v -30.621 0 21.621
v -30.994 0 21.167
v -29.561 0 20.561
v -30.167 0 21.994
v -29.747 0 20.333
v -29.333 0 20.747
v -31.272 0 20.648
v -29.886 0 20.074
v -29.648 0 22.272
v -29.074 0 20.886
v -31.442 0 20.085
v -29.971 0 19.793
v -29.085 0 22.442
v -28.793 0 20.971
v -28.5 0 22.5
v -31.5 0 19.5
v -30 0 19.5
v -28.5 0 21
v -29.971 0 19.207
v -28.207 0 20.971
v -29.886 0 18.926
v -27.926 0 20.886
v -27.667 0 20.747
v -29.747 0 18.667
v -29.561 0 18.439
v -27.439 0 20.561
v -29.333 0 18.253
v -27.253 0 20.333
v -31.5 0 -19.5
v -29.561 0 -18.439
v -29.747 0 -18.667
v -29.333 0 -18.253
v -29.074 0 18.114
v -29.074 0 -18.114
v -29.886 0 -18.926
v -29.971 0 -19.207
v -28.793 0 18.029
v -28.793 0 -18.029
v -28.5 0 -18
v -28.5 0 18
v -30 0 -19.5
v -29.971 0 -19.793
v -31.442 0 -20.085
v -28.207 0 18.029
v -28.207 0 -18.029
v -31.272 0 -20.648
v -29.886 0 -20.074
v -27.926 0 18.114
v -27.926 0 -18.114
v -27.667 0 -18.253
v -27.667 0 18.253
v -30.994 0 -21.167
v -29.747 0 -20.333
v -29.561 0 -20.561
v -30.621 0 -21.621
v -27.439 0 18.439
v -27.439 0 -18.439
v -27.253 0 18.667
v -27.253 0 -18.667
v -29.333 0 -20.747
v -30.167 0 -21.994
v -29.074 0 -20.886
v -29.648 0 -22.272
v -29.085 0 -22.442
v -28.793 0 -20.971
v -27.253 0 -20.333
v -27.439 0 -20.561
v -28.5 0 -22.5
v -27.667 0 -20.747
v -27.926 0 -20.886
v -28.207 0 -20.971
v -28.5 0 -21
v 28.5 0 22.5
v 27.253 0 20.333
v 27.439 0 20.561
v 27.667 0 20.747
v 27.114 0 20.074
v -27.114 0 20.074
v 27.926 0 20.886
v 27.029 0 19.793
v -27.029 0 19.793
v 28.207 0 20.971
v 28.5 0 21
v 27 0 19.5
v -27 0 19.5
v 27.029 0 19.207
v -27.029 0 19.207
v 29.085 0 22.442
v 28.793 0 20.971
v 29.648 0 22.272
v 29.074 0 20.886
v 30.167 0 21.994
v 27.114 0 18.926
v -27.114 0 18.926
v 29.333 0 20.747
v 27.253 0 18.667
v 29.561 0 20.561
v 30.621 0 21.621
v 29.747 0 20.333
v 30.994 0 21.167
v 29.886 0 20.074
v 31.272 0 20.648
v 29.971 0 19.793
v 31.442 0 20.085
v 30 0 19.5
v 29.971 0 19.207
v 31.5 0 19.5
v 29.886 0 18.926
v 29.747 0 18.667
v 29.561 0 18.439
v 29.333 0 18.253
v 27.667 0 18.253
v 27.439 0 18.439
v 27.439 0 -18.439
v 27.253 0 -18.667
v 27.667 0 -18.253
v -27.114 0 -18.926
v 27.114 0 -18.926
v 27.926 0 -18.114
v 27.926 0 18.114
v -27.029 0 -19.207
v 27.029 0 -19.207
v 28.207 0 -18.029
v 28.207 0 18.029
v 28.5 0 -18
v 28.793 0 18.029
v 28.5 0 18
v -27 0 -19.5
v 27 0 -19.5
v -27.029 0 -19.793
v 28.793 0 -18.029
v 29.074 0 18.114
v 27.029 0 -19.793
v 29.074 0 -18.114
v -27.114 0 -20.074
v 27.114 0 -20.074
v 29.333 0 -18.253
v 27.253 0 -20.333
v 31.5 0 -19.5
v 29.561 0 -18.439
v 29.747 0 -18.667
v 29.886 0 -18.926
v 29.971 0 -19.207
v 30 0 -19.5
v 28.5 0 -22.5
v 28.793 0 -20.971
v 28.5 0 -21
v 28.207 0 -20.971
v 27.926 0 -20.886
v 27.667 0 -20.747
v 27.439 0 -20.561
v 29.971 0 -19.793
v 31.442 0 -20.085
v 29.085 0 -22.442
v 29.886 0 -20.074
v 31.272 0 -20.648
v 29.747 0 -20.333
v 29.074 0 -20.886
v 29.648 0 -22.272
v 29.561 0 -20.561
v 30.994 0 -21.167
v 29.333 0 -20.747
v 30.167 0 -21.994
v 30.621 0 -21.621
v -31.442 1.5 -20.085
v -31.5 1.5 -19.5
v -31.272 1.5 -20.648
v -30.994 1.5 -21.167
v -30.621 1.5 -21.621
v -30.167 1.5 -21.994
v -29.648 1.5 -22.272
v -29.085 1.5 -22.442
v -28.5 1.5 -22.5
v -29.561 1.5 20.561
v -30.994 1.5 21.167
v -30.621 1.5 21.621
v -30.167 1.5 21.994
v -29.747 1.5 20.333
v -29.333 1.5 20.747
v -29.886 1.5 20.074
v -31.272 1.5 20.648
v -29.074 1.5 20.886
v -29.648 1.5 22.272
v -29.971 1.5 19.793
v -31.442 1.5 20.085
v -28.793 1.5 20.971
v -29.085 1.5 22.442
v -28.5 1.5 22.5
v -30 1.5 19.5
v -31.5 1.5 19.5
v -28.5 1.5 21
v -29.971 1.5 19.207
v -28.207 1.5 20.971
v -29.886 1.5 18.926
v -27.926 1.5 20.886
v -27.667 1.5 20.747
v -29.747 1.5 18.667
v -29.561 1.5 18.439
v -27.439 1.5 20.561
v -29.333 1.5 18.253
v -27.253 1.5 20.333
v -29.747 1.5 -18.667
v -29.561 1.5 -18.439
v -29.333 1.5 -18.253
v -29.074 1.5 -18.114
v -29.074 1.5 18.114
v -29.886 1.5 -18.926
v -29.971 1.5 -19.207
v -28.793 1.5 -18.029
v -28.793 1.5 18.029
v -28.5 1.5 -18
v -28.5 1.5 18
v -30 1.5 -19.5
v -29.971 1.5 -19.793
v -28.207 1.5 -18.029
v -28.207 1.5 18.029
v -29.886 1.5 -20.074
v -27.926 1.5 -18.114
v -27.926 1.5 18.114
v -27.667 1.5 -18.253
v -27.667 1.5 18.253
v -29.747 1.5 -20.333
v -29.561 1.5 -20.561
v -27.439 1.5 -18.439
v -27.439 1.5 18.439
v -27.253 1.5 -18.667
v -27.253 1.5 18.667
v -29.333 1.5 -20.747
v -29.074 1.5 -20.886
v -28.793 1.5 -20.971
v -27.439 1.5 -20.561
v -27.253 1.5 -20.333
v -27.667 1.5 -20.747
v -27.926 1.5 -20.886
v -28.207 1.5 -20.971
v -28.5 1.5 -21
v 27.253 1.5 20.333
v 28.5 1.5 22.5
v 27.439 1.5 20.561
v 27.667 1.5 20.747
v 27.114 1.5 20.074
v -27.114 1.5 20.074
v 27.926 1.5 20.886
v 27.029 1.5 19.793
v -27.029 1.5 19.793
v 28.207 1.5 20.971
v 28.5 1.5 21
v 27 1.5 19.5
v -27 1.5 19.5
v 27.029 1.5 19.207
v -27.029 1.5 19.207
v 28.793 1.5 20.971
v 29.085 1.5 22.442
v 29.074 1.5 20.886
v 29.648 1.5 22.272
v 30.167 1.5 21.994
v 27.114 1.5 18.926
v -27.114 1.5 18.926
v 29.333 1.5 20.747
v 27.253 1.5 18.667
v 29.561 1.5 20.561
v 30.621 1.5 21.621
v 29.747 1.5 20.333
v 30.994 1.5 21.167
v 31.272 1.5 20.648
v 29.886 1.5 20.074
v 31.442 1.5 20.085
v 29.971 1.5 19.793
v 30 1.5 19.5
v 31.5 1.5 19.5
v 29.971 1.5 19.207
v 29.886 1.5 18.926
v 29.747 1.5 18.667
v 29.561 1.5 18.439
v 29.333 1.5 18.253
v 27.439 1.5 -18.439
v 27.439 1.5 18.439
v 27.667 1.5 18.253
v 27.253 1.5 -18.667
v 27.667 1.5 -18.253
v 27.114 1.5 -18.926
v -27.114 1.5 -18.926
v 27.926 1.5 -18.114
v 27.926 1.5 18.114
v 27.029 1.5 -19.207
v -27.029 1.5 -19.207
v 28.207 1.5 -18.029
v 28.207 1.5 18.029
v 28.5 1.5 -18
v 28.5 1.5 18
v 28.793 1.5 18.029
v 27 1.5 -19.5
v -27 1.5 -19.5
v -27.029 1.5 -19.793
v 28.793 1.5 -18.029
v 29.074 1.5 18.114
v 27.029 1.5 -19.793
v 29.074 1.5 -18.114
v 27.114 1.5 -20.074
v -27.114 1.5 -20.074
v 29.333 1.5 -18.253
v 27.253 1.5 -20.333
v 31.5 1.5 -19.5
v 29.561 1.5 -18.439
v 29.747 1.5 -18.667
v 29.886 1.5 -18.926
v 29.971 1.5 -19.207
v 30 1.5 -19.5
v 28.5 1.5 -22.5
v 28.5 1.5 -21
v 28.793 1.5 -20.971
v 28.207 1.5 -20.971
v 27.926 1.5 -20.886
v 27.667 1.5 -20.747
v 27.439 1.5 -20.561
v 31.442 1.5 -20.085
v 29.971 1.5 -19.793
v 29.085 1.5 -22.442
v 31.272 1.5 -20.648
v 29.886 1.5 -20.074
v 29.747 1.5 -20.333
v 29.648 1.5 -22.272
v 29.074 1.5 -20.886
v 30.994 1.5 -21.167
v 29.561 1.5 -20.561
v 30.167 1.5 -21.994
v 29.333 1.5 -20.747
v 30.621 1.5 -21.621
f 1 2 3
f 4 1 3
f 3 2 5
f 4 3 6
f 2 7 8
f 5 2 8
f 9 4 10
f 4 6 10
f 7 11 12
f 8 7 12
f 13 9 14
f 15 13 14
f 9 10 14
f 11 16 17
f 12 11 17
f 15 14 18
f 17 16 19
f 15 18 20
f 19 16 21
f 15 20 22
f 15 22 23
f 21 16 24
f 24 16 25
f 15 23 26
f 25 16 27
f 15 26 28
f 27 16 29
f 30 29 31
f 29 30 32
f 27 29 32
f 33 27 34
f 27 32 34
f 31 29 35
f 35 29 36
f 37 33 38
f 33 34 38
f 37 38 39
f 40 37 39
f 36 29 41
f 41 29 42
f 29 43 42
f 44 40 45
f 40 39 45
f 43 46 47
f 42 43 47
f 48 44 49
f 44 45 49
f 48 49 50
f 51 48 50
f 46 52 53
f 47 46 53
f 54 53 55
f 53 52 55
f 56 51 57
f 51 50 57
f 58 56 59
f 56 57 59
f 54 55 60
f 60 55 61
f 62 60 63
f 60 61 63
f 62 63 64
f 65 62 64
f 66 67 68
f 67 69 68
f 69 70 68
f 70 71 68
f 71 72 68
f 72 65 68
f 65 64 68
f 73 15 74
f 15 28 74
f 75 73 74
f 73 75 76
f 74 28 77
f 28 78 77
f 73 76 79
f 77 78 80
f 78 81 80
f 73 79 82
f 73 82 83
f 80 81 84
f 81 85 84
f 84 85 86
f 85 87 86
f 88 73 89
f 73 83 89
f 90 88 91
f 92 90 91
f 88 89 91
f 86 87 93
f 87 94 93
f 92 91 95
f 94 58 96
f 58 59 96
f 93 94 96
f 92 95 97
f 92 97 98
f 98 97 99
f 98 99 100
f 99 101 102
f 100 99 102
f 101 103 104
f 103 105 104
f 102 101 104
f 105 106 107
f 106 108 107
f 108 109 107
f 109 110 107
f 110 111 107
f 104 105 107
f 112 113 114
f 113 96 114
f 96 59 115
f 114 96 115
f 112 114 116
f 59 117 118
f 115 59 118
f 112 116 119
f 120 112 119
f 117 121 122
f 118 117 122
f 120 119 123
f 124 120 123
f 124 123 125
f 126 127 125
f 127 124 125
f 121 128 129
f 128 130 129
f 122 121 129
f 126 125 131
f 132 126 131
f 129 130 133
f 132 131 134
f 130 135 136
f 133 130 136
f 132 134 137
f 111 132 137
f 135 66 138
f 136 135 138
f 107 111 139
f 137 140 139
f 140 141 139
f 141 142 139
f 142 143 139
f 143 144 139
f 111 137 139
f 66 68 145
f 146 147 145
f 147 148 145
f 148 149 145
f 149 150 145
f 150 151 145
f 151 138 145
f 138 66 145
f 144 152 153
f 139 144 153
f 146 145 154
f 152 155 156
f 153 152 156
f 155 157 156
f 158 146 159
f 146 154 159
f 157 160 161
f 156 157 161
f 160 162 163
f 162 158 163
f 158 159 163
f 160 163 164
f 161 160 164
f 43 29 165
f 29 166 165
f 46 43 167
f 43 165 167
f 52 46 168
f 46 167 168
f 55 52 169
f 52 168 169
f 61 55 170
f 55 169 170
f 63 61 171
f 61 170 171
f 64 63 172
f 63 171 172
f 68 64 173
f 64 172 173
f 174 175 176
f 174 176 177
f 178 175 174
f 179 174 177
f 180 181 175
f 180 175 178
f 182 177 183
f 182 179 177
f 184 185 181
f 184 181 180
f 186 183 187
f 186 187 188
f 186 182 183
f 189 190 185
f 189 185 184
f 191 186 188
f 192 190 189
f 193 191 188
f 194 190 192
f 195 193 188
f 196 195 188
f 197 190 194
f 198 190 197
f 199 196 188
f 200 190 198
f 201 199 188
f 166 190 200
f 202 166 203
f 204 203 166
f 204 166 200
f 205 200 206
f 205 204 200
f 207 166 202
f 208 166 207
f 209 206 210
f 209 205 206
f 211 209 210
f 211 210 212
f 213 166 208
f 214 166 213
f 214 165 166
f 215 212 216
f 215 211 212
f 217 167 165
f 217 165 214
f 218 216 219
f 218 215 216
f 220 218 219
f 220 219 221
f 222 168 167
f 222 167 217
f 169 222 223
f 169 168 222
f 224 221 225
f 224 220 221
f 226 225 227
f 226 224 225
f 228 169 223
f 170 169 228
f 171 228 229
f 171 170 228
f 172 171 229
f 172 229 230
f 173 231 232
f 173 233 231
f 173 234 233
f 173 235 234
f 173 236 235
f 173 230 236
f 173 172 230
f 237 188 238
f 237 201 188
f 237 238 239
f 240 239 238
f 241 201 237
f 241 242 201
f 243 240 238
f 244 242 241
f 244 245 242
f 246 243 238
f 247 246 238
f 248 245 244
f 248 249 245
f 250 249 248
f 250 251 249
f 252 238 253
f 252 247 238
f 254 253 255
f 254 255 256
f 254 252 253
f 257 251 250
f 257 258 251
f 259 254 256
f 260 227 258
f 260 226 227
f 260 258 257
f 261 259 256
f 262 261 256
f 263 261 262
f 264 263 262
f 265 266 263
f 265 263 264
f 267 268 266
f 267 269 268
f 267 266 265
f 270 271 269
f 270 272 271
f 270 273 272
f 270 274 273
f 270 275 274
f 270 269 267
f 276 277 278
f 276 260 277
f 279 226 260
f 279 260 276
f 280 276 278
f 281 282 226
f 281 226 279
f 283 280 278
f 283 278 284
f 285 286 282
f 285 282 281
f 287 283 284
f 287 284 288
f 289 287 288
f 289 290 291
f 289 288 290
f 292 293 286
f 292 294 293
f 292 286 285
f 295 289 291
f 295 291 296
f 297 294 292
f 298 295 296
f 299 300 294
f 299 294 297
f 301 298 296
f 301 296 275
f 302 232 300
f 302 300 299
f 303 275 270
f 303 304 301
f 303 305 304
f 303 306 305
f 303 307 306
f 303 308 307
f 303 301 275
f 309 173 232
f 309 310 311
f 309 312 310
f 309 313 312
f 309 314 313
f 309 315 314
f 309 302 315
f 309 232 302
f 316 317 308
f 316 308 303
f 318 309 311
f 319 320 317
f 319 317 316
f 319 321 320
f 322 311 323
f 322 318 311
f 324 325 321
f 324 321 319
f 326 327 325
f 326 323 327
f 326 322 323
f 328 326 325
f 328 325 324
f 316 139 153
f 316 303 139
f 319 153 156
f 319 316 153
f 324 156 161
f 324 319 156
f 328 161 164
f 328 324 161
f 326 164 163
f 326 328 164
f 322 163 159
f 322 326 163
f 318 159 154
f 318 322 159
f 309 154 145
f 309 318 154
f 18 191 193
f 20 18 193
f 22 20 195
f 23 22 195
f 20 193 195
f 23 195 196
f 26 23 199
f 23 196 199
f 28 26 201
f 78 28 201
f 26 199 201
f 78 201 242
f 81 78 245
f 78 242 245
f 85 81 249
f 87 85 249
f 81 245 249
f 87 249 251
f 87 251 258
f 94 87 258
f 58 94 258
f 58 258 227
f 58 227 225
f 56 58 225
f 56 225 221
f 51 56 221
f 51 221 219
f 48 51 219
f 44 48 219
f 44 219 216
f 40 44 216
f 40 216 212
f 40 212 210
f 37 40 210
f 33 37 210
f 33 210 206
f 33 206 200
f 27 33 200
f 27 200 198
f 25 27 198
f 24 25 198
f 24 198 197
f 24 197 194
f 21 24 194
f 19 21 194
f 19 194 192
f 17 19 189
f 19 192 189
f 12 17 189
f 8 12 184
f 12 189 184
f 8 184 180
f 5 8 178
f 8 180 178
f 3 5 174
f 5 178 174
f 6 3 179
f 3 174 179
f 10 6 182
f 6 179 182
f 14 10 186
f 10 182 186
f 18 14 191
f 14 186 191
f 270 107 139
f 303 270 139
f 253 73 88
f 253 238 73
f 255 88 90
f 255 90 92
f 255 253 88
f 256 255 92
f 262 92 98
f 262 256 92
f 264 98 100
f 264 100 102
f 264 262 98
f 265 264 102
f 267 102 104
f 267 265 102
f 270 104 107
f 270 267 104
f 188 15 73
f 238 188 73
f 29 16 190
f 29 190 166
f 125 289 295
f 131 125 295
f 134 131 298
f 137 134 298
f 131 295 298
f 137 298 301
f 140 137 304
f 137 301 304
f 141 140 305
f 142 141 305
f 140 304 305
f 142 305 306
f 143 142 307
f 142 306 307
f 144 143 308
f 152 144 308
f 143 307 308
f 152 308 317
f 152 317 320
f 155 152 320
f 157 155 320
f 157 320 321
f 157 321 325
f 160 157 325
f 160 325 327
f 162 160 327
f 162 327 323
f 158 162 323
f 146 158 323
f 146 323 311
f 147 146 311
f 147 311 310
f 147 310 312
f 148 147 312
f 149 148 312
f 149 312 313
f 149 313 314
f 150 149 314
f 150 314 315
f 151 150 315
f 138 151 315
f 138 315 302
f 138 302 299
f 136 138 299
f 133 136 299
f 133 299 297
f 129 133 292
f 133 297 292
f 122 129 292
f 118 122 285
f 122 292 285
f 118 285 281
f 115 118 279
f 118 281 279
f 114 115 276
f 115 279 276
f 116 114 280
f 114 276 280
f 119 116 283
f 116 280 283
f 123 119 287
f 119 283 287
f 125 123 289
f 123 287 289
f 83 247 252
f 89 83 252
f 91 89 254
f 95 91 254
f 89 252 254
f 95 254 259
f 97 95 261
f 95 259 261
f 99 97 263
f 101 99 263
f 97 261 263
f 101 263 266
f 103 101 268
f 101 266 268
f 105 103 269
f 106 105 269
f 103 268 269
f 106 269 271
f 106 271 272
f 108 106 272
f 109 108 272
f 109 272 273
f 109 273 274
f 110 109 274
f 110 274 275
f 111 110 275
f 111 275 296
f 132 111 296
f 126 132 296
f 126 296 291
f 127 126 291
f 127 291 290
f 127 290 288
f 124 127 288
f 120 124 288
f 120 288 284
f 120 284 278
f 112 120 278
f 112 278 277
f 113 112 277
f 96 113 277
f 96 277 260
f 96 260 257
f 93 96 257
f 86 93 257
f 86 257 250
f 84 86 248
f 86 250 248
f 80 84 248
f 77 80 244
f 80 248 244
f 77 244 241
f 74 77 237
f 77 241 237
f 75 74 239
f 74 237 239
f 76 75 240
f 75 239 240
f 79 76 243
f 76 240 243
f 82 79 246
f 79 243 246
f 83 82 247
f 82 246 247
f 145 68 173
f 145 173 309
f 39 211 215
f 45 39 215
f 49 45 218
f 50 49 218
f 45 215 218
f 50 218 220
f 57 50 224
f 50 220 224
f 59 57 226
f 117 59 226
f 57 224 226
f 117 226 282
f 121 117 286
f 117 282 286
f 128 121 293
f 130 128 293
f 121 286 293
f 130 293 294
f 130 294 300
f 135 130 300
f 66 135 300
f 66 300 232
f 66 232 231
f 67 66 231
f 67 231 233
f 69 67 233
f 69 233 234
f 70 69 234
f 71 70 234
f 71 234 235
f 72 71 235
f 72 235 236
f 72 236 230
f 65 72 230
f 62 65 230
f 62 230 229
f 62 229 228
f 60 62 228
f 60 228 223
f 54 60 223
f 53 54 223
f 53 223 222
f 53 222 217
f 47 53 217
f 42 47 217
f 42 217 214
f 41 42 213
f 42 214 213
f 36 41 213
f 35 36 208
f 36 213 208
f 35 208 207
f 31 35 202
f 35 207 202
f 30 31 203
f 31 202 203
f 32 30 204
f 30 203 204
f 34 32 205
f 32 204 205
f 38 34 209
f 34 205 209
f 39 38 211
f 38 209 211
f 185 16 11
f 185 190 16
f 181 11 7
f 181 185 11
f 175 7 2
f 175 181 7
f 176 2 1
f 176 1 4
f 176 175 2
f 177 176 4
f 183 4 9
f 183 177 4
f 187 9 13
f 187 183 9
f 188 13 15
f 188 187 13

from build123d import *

# Parameters (mm, degrees)
SKETCH_1_W          = 63
SKETCH_1_H          = 45
EXTRUDE_1_DEPTH     = 1.5
FILLET_1_R          = 3
SKETCH_2_R          = 1.5
CUT_EXTRUDE_1_DEPTH = 39.73951471


with BuildPart() as part:
    # Эскиз1 → Бобышка-Вытянуть1 (new body)
    with BuildSketch(Plane(origin=(0, 0, 0), x_dir=(1, 0, 0), z_dir=(0, 1, 0))):
        Rectangle(SKETCH_1_W, SKETCH_1_H)
    extrude(amount=EXTRUDE_1_DEPTH)

    # Скругление1
    fillet_1_edges = [part.edges().sort_by_distance(p)[0] for p in [
        (-31.5, 0.75, -22.5),
        (31.5, 0.75, -22.5),
        (31.5, 0.75, 22.5),
        (-31.5, 0.75, 22.5),
    ]]
    fillet(fillet_1_edges, radius=FILLET_1_R)

    # Эскиз2 → Вырез-Вытянуть1 (cut, through all)
    with BuildSketch(Plane(origin=(0, 1.5, 0), x_dir=(1, 0, 0), z_dir=(0, 1, 0))):
        with Locations(Location((-28.5, 19.5, 0), (0, 0, 270))):
            Circle(SKETCH_2_R)
        with Locations(Location((28.5, 19.5, 0), (0, 0, 270))):
            Circle(SKETCH_2_R)
        with Locations(Location((28.5, -19.5, 0), (0, 0, 270))):
            Circle(SKETCH_2_R)
        with Locations(Location((-28.5, -19.5, 0), (0, 0, 270))):
            Circle(SKETCH_2_R)
    extrude(amount=-CUT_EXTRUDE_1_DEPTH, mode=Mode.SUBTRACT)


solid = part.part
